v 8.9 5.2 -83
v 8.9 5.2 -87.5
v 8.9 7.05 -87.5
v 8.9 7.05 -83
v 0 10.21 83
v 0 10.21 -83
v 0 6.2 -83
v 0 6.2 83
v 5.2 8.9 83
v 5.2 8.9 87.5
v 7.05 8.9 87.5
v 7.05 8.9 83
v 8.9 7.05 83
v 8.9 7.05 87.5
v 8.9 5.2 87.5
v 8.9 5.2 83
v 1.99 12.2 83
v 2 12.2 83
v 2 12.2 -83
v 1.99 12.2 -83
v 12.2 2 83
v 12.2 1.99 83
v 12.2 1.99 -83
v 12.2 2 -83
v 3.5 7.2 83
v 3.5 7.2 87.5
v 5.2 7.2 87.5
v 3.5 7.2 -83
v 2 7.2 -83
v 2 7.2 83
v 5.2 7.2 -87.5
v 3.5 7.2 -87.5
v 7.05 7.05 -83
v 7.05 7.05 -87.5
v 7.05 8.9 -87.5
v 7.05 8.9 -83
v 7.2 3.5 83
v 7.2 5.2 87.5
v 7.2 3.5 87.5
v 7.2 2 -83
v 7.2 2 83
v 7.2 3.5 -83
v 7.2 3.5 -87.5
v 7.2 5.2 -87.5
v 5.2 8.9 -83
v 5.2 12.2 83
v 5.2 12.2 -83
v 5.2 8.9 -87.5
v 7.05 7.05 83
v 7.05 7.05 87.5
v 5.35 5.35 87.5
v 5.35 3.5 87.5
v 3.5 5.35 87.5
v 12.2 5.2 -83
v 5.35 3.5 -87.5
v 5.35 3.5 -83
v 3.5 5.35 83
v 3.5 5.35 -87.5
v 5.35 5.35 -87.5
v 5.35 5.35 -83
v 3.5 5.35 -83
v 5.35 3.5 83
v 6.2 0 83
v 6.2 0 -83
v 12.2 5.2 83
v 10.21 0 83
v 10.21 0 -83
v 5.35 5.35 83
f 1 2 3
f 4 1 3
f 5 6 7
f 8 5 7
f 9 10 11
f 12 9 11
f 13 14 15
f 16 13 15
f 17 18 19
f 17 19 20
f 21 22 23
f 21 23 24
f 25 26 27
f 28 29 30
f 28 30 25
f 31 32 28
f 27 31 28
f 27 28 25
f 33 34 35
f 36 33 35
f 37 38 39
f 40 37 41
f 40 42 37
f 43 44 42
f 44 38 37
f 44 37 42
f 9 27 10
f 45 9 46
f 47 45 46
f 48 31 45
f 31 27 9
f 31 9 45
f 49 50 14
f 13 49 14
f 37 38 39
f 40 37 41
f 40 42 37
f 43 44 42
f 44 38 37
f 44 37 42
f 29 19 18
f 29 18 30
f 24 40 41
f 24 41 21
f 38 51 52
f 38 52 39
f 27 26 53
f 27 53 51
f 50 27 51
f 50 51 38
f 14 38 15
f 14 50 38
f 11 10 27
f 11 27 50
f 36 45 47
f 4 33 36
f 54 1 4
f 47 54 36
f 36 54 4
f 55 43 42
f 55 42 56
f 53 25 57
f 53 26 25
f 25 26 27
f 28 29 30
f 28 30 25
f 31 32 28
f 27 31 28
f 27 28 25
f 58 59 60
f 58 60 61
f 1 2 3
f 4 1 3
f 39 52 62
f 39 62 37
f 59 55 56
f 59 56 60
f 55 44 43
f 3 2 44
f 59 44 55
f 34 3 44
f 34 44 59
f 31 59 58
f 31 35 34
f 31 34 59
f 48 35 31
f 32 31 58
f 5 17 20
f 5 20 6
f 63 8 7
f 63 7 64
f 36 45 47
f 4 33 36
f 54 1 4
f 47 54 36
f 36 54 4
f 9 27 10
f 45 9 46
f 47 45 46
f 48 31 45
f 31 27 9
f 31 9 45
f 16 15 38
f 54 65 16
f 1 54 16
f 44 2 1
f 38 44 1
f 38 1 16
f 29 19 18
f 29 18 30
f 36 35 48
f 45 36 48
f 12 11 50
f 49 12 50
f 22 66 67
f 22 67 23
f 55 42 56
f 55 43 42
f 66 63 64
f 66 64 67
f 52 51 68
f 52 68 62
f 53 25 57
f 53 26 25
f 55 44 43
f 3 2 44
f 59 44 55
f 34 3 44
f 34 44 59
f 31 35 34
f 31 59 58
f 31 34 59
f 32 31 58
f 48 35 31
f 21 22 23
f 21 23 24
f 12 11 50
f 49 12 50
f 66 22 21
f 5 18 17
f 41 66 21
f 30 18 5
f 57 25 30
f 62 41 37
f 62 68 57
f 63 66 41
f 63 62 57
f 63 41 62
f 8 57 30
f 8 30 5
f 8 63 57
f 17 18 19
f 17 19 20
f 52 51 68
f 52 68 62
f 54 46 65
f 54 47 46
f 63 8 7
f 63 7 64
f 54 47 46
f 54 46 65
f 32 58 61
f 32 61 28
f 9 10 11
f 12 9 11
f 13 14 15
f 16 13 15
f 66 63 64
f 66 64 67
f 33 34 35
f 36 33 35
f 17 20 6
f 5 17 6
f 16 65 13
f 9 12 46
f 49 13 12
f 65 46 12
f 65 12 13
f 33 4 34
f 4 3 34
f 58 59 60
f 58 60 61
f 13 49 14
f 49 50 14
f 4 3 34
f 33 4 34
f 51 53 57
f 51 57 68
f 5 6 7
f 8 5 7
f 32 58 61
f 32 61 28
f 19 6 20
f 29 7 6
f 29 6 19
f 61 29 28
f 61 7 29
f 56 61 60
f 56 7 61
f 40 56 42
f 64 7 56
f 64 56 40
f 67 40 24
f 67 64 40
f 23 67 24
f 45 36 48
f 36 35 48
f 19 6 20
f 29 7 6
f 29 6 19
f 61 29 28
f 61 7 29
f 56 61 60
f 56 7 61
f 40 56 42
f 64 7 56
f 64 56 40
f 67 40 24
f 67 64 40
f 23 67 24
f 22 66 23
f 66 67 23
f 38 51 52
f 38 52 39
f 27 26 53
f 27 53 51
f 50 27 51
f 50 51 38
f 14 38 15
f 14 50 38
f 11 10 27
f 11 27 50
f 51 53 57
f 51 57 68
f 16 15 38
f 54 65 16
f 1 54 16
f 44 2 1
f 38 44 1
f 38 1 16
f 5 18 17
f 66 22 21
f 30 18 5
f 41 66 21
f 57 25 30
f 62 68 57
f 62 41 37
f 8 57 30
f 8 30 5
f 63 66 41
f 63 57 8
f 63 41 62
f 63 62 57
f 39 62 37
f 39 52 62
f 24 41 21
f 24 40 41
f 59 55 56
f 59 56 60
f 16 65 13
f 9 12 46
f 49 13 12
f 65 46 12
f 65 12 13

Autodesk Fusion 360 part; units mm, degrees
sketch "Esquisse1" plane through (0, 0, 0) normal (0, 0, 1) x (1, 0, 0)
  line L0 (2, 12.2) -> (2, 7.2)
  line L1 (2, 7.2) -> (5.2, 7.2)
  line L2 (5.2, 7.2) -> (5.2, 12.2)
  line L3 (2, 12.2) -> (1.99, 12.2)
  line L4 (0, 0) -> (10.6066, 10.6066)
  line L5 (0, 0) -> (15, 0) construction
  line L6 (0, 10.21) -> (0, 6.2)
  line L7 (0, 6.2) -> (3.1, 3.1)
  line L8 (5.2, 12.2) -> (8.7, 8.7)
  line L9 (1.99, 12.2) -> (0, 10.21)
  point P0 (0, 12.2)
  dimension "d1" = 5
  dimension "d2" = 3.2
  dimension "d5" = 7.2
  dimension "d6" = 45
  dimension "d7" = 15
  dimension "d8" = 6
  dimension "d9" = 2
  dimension "d15" = 1.99
  dimension "d16" = 1.99
extrude "Extrusion1" add sketch "Esquisse1" along normal blind 254.5 makes body 1
mirror "Symétrie miroir1" about plane through (3.1, 3.1, 0) normal (-0.7071, 0.7071, 0) of bodies 1 merged
sketch "Esquisse4" plane through (0, 0, 254.5) normal (0, 0, 1) x (-1, 0, 0)
  line L0 (-2, -12.2) -> (-1.99, -12.2)
  line L1 (-1.99, -12.2) -> (0, -10.21)
  line L2 (0, -10.21) -> (0, -6.2)
  line L3 (0, -6.2) -> (-6.2, 0)
  line L4 (-6.2, 0) -> (-10.21, 0)
  line L5 (-10.21, 0) -> (-12.2, -1.99)
  line L6 (-12.2, -1.99) -> (-12.2, -2)
  line L7 (-12.2, -2) -> (-7.2, -2)
  line L8 (-7.2, -2) -> (-7.2, -5.2)
  line L9 (-7.2, -5.2) -> (-12.2, -5.2)
  line L10 (-12.2, -5.2) -> (-5.2, -12.2)
  line L11 (-5.2, -12.2) -> (-5.2, -7.2)
  line L12 (-5.2, -7.2) -> (-2, -7.2)
  line L13 (-2, -7.2) -> (-2, -12.2)
  line L14 (-5.2, -8.9) -> (-7.05, -8.9)
  line L15 (-7.05, -8.9) -> (-7.05, -7.05)
  line L16 (-7.05, -7.05) -> (-8.9, -7.05)
  line L17 (-8.9, -7.05) -> (-8.9, -5.2)
  line L18 (-5.2, -7.2) -> (-7.2, -5.2)
  line L19 (-3.5, -7.2) -> (-3.5, -5.35)
  line L20 (-3.5, -5.35) -> (-5.35, -5.35)
  line L21 (-5.35, -5.35) -> (-5.35, -3.5)
  line L22 (-5.35, -3.5) -> (-7.2, -3.5)
  point P0 (-7.2, -5.2)
  point P1 (-5.2, -7.2)
  point P2 (-7.2, -5.2)
  point P3 (-5.2, -7.2)
  dimension "d23" = 1.85
extrude "Extrusion3" cut sketch "Esquisse4" against normal blind 4.5 contours L0 L1 L2 L3 L4 L5 L6 L7 L8 L12 L13 L19 L20 L21 L22 | L9 L10 L11 L14 L15 L16 L17 bodies 1
copy_body "Corps->Comp2" bodies 1 removing the originals makes body 2 in component "Component"
component "Component" placed x (1, 0, 0) y (0, 1, 0) z (0, 0, 1) at (0, 0, 0)
equation "d5 = d2 + 2 * d9"
equation "d8 = d1 + 1 mm"
equation "d16 = d15"

Autodesk Fusion 360 part; units mm, degrees
sketch "Esquisse1" plane through (0, 0, 0) normal (0, 0, 1) x (1, 0, 0)
  line L0 (2, 12.2) -> (2, 7.2)
  line L1 (2, 7.2) -> (5.2, 7.2)
  line L2 (5.2, 7.2) -> (5.2, 12.2)
  line L3 (2, 12.2) -> (1.99, 12.2)
  line L4 (0, 0) -> (10.6066, 10.6066)
  line L5 (0, 0) -> (15, 0) construction
  line L6 (0, 10.21) -> (0, 6.2)
  line L7 (0, 6.2) -> (3.1, 3.1)
  line L8 (5.2, 12.2) -> (8.7, 8.7)
  line L9 (1.99, 12.2) -> (0, 10.21)
  point P0 (0, 12.2)
  dimension "d1" = 5
  dimension "d2" = 3.2
  dimension "d5" = 7.2
  dimension "d6" = 45
  dimension "d7" = 15
  dimension "d8" = 6
  dimension "d9" = 2
  dimension "d15" = 1.99
  dimension "d16" = 1.99
extrude "Extrusion1" add sketch "Esquisse1" along normal blind 87.5 makes body 1
mirror "Symétrie miroir1" about plane through (3.1, 3.1, 0) normal (-0.7071, 0.7071, 0) of bodies 1 merged
sketch "Esquisse4" plane through (0, 0, 87.5) normal (0, 0, 1) x (-1, 0, 0)
  line L0 (-2, -12.2) -> (-1.99, -12.2)
  line L1 (-1.99, -12.2) -> (0, -10.21)
  line L2 (0, -10.21) -> (0, -6.2)
  line L3 (0, -6.2) -> (-6.2, 0)
  line L4 (-6.2, 0) -> (-10.21, 0)
  line L5 (-10.21, 0) -> (-12.2, -1.99)
  line L6 (-12.2, -1.99) -> (-12.2, -2)
  line L7 (-12.2, -2) -> (-7.2, -2)
  line L8 (-7.2, -2) -> (-7.2, -5.2)
  line L9 (-7.2, -5.2) -> (-12.2, -5.2)
  line L10 (-12.2, -5.2) -> (-5.2, -12.2)
  line L11 (-5.2, -12.2) -> (-5.2, -7.2)
  line L12 (-5.2, -7.2) -> (-2, -7.2)
  line L13 (-2, -7.2) -> (-2, -12.2)
  line L14 (-5.2, -8.9) -> (-7.05, -8.9)
  line L15 (-7.05, -8.9) -> (-7.05, -7.05)
  line L16 (-7.05, -7.05) -> (-8.9, -7.05)
  line L17 (-8.9, -7.05) -> (-8.9, -5.2)
  line L18 (-5.2, -7.2) -> (-7.2, -5.2)
  line L19 (-3.5, -7.2) -> (-3.5, -5.35)
  line L20 (-3.5, -5.35) -> (-5.35, -5.35)
  line L21 (-5.35, -5.35) -> (-5.35, -3.5)
  line L22 (-5.35, -3.5) -> (-7.2, -3.5)
  point P0 (-7.2, -5.2)
  point P1 (-5.2, -7.2)
  point P2 (-7.2, -5.2)
  point P3 (-5.2, -7.2)
  dimension "d23" = 1.85
extrude "Extrusion3" cut sketch "Esquisse4" against normal blind 4.5 contours L0 L1 L2 L3 L4 L5 L6 L7 L8 L12 L13 L19 L20 L21 L22 | L9 L10 L11 L14 L15 L16 L17 bodies 1
copy_body "Corps->Comp2" bodies 1 removing the originals makes body 2 in component "Component"
mirror "Symétrie miroir1'" about plane through (0, 0, 0) normal (0, 0, -1) of bodies 2 merged in component "Component"
component "Component" placed x (1, 0, 0) y (0, 1, 0) z (0, 0, 1) at (0, 0, 0)
equation "d5 = d2 + 2 * d9"
equation "d8 = d1 + 1 mm"
equation "d10 = 92.00 mm - 4.5 mm"
equation "d16 = d15"
